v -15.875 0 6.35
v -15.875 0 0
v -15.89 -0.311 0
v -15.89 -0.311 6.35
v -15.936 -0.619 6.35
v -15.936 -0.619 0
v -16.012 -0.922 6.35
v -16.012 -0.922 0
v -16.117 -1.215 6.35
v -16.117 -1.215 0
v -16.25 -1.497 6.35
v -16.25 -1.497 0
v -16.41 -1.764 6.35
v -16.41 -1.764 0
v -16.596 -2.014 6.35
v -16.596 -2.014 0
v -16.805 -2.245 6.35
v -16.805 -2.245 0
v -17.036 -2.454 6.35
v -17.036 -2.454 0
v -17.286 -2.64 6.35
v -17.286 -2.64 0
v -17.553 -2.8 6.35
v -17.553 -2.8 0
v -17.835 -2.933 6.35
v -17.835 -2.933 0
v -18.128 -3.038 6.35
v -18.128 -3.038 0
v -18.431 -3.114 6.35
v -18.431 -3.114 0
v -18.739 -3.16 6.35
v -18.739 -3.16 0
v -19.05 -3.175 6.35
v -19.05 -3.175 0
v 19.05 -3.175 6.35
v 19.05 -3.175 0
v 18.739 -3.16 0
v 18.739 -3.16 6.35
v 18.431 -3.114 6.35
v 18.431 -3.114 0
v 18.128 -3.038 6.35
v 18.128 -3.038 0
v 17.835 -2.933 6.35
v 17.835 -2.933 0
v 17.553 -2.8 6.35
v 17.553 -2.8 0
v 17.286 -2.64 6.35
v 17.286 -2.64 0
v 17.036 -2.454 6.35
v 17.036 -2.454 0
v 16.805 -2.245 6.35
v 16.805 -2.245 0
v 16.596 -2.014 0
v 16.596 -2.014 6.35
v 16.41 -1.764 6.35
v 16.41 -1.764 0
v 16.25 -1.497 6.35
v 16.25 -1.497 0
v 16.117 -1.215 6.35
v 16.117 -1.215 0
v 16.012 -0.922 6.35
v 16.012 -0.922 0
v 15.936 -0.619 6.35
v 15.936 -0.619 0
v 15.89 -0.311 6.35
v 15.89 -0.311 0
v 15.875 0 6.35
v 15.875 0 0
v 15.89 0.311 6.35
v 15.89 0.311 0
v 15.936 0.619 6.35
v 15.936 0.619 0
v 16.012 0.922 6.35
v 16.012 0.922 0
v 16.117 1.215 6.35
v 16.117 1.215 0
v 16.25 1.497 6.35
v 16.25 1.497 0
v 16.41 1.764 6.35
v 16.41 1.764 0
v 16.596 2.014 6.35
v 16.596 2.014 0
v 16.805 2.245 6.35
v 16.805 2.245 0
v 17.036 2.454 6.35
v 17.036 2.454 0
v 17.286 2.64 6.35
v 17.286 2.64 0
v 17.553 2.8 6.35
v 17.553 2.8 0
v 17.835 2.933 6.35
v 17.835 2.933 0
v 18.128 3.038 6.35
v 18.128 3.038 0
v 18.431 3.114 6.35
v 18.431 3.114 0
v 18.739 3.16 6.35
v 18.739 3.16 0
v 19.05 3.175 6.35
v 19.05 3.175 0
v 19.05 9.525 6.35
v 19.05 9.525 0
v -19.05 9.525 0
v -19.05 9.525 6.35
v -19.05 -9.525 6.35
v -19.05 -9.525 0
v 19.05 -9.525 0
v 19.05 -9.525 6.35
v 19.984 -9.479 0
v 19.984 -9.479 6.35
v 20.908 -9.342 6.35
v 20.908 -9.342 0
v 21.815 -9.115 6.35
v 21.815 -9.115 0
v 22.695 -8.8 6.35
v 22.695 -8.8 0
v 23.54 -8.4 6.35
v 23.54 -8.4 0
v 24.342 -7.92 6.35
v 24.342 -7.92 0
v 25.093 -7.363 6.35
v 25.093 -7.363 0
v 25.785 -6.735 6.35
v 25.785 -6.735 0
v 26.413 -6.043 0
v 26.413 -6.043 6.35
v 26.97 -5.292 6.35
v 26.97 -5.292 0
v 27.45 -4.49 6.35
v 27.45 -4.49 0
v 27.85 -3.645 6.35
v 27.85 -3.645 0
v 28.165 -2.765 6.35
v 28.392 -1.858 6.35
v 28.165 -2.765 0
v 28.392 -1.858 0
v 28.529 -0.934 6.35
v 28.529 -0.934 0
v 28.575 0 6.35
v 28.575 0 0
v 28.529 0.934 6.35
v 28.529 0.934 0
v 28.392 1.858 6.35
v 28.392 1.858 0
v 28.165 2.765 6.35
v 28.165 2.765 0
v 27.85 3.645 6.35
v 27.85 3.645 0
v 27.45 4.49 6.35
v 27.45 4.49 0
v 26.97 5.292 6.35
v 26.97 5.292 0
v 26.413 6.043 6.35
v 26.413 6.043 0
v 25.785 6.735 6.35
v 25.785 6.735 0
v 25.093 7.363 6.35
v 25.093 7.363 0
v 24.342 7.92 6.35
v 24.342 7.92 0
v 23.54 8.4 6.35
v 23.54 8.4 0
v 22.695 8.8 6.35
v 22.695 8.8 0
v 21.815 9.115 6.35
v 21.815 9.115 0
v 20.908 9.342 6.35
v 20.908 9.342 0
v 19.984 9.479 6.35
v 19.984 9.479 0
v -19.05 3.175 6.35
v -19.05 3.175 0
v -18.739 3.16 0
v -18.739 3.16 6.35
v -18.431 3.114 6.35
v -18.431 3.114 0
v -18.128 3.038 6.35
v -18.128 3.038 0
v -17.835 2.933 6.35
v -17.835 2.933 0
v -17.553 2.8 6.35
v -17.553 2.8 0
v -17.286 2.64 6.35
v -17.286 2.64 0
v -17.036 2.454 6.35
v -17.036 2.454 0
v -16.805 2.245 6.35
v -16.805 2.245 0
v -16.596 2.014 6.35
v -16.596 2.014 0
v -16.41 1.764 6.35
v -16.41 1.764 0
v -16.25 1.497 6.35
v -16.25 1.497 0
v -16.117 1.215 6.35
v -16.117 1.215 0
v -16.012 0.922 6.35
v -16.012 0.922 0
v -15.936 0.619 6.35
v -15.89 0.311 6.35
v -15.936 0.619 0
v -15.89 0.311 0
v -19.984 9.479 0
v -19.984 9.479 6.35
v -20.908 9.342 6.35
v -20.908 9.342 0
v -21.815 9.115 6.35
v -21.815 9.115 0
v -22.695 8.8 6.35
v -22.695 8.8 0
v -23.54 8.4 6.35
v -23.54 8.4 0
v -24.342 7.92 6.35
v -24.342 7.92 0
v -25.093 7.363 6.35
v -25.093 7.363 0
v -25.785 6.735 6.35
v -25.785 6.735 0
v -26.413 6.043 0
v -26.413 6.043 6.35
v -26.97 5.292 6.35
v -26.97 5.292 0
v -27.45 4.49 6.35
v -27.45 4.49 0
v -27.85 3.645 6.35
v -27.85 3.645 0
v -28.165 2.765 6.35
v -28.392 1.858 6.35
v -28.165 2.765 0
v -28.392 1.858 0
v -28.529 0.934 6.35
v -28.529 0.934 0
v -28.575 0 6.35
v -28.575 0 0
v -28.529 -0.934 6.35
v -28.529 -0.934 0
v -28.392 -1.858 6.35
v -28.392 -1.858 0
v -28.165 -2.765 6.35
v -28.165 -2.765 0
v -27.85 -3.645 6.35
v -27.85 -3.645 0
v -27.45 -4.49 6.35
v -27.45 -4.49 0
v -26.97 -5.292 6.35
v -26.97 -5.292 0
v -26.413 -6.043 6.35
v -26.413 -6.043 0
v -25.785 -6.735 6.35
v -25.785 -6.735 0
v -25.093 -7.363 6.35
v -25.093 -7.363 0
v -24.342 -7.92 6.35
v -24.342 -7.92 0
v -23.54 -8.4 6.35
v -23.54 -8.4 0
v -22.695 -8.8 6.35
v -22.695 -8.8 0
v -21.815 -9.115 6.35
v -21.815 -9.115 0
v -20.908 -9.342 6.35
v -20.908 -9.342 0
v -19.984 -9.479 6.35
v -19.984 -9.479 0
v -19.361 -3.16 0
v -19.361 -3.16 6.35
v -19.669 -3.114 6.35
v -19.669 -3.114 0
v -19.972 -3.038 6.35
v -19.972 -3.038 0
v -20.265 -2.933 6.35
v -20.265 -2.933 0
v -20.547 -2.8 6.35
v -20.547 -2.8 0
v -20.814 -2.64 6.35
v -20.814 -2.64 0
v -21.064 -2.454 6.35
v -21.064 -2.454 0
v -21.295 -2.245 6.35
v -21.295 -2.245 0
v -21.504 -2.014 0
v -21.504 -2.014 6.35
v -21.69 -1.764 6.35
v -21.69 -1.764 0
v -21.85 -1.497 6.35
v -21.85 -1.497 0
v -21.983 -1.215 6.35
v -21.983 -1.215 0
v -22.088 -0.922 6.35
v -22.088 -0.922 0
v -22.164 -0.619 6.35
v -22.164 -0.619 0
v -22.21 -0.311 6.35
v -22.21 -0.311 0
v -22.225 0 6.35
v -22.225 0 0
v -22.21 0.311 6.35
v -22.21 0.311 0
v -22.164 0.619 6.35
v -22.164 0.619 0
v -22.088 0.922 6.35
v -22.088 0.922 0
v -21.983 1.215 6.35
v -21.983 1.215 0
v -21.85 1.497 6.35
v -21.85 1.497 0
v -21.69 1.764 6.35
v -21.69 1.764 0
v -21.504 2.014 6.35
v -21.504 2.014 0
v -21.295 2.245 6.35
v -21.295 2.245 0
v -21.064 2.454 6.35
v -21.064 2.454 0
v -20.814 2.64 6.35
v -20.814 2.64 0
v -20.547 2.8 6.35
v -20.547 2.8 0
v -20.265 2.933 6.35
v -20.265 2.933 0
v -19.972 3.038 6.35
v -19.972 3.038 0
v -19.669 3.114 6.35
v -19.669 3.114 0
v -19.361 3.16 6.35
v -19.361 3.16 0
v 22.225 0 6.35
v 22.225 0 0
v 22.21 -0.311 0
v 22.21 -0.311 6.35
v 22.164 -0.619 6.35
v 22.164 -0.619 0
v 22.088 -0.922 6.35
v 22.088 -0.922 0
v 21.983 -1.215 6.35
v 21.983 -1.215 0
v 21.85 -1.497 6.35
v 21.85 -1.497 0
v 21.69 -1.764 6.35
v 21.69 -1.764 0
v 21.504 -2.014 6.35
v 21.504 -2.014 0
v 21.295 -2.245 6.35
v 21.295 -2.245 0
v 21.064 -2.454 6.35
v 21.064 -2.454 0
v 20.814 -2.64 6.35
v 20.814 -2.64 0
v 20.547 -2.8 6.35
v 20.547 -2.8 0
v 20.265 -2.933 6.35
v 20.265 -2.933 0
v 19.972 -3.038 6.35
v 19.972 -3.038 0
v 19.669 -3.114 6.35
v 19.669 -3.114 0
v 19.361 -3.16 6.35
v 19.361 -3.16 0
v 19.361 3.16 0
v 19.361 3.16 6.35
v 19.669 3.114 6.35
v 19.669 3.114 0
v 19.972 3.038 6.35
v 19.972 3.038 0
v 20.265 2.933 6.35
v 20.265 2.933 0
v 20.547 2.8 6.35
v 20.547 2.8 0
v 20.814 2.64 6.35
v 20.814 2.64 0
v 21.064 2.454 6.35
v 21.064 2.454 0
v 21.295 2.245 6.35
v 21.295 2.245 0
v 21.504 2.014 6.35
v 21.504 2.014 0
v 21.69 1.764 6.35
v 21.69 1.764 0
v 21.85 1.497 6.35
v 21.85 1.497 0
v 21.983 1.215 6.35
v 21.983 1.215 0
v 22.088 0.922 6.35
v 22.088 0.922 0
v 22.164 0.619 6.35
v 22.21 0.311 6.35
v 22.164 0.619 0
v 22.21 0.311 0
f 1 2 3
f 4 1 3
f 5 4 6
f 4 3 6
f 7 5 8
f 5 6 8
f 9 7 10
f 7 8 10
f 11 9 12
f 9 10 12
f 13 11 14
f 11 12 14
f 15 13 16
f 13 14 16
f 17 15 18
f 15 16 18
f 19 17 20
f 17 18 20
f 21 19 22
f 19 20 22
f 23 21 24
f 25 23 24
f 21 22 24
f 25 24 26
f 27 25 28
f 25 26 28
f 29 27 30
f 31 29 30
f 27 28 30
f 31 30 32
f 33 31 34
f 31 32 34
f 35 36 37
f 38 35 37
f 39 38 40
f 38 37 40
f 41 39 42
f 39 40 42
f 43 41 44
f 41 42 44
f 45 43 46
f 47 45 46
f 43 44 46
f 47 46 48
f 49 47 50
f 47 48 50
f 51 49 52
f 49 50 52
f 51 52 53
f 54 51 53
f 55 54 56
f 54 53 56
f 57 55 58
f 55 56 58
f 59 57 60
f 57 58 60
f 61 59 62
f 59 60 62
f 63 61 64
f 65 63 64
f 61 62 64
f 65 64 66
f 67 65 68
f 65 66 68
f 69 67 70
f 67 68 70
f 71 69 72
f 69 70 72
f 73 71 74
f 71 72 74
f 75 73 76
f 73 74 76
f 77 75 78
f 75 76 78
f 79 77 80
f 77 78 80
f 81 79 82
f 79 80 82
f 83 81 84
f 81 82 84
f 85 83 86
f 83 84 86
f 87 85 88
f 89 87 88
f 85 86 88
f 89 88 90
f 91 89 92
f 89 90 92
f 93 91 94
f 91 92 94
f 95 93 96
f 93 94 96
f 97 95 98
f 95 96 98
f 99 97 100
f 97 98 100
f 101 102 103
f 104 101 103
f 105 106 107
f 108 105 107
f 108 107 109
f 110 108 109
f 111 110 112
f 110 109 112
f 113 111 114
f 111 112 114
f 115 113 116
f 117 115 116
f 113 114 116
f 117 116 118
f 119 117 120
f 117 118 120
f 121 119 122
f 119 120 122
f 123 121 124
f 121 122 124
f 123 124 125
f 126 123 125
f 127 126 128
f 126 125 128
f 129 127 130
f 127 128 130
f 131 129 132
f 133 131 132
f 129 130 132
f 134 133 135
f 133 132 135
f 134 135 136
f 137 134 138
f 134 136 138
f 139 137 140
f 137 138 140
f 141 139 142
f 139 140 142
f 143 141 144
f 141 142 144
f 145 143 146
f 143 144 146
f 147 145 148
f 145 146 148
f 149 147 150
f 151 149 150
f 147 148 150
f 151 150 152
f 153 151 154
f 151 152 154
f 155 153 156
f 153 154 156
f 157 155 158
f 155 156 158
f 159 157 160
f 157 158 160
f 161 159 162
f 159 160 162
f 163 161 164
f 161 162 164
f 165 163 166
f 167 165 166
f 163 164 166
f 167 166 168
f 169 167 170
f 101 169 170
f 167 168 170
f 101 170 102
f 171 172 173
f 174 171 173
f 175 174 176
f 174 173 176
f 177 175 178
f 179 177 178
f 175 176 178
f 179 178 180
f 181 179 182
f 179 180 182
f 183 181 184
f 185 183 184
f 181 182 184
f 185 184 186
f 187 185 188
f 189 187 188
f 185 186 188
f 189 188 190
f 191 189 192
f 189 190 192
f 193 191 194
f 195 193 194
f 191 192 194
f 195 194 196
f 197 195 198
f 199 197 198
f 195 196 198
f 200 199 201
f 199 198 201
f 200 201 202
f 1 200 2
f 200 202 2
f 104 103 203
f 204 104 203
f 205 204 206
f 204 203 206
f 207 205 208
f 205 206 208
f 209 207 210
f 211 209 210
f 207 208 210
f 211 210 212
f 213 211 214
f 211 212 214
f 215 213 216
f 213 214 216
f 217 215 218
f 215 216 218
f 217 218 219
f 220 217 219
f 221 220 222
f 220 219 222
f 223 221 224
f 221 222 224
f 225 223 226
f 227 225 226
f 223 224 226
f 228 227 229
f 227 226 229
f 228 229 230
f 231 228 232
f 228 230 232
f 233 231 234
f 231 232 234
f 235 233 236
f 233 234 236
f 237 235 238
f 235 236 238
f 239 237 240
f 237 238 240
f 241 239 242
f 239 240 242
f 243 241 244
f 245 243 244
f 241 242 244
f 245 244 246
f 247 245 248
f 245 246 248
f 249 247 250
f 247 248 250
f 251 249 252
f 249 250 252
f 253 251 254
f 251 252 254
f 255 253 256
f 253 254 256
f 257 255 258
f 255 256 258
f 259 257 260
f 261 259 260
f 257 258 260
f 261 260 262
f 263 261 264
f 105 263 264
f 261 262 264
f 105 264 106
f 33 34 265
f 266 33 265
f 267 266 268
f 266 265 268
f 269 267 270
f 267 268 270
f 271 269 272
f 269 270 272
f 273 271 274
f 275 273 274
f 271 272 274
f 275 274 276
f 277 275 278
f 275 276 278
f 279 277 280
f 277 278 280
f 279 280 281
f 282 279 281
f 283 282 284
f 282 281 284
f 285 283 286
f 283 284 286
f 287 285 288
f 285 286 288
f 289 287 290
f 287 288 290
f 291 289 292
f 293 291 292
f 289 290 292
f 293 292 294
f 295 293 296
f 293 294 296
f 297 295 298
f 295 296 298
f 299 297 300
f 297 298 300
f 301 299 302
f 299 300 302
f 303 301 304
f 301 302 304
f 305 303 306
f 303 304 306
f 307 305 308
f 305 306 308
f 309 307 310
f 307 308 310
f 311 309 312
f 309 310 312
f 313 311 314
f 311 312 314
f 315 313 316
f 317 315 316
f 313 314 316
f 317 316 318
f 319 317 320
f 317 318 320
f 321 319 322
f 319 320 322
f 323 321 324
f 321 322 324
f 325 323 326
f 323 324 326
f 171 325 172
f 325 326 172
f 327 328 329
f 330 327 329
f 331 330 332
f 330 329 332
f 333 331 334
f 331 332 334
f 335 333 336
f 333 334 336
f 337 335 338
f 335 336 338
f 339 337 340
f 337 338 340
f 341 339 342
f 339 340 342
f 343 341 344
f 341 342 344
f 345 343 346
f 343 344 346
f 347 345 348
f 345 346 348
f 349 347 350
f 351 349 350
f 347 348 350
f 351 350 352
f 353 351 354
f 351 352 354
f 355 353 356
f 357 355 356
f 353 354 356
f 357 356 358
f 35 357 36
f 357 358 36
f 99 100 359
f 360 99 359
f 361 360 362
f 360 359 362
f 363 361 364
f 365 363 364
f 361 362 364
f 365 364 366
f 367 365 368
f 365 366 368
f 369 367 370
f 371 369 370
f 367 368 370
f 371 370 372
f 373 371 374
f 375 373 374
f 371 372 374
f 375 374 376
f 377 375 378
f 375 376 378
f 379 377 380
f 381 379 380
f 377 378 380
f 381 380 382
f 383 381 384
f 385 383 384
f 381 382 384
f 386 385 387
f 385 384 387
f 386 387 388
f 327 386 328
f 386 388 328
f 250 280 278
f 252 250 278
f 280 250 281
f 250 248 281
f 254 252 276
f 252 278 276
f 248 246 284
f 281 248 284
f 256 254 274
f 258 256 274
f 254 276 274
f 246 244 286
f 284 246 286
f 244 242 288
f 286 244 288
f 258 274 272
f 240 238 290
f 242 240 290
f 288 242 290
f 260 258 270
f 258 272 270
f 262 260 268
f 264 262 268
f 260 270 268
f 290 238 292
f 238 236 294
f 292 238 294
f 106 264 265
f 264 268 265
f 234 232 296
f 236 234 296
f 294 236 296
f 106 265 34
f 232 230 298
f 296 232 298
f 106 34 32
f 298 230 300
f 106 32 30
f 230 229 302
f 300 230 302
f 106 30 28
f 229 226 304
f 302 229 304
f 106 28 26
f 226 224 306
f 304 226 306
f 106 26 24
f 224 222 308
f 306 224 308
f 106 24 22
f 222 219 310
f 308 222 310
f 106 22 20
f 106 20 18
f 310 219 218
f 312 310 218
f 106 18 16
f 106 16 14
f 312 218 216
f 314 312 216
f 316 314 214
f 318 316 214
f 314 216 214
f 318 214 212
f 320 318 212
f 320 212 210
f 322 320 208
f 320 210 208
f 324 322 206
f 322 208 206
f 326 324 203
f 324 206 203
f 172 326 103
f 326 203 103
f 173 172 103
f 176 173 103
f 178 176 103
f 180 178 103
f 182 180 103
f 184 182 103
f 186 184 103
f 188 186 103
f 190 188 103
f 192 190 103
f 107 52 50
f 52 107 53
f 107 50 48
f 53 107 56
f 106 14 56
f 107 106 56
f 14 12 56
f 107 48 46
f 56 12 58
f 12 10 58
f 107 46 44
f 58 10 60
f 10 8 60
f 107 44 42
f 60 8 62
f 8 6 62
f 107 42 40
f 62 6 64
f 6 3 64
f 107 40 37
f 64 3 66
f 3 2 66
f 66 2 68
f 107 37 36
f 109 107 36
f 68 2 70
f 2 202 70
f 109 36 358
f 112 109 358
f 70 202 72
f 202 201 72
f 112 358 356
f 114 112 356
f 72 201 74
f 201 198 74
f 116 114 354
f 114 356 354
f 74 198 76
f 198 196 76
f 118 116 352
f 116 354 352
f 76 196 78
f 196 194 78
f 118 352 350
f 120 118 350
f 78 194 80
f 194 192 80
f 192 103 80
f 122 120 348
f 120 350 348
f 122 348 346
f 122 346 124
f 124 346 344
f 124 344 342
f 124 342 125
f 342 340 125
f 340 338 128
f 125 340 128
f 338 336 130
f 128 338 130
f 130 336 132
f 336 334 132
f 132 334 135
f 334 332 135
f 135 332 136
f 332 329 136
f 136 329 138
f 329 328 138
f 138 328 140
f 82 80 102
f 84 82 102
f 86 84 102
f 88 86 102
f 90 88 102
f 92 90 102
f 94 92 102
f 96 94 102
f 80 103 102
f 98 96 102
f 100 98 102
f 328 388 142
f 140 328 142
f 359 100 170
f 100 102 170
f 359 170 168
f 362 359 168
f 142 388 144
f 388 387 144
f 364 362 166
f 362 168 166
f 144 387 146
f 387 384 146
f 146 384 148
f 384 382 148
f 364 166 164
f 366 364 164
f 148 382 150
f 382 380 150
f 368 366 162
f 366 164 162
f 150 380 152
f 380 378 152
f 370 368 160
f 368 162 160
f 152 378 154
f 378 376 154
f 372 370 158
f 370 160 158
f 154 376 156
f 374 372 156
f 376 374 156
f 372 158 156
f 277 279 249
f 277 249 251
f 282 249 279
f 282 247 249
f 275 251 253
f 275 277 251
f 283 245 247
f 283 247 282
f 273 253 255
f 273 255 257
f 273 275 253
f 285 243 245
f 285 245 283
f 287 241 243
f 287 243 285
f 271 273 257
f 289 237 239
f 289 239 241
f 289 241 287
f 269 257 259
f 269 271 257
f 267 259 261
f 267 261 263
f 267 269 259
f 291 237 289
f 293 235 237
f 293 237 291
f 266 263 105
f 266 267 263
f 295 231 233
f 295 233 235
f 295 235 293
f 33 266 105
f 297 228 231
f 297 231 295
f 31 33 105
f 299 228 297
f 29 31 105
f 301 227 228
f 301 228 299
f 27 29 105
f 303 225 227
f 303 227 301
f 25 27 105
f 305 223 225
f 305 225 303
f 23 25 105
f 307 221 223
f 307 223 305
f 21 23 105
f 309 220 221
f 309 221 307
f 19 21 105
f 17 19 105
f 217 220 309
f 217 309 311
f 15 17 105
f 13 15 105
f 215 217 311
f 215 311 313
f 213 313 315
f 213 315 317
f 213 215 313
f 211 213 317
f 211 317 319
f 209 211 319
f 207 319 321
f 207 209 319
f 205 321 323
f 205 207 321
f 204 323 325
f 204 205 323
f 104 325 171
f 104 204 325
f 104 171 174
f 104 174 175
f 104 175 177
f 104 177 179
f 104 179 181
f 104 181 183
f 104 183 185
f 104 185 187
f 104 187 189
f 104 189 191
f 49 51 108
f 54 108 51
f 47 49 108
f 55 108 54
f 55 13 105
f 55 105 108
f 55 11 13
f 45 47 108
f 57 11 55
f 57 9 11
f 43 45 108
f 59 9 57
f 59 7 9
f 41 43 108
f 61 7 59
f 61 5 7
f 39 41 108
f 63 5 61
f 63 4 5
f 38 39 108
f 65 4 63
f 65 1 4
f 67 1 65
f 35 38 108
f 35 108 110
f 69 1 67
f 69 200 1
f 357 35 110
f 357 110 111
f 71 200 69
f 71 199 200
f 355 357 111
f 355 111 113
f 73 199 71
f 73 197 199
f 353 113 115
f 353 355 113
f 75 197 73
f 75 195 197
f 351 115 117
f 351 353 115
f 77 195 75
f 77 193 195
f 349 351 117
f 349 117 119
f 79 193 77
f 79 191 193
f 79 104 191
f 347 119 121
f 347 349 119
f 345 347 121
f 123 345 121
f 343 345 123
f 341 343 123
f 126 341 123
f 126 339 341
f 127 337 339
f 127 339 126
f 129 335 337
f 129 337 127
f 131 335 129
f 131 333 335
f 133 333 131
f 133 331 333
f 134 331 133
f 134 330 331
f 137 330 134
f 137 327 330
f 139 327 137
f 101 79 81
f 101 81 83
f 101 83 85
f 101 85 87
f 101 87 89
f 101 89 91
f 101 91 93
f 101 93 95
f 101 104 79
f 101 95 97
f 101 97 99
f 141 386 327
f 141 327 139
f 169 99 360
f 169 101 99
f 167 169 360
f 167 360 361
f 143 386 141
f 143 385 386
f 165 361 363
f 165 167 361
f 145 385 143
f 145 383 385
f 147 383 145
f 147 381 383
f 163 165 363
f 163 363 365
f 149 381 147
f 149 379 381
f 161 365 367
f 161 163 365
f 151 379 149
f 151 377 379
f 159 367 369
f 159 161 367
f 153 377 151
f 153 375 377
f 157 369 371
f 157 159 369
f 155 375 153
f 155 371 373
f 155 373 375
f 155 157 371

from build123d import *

# Parameters (mm, degrees)
F1_DEPTH = 6.35


with BuildPart() as f1:
    # F0 (on Top) → F1 (new body)
    with BuildSketch(Plane.XY):
        with BuildLine():
            Line((19.05, 3.175), (19.05, 9.525))
            Line((19.05, 9.525), (-19.05, 9.525))
            Line((-19.05, 9.525), (-19.05, 3.175))
            ThreePointArc((-19.05, 3.175), (-16.804936, 2.245064), (-15.875, 0))
            ThreePointArc((-15.875, 0), (-16.804936, -2.245064), (-19.05, -3.175))
            Line((-19.05, -3.175), (-19.05, -9.525))
            Line((-19.05, -9.525), (19.05, -9.525))
            Line((19.05, -9.525), (19.05, -3.175))
            ThreePointArc((19.05, -3.175), (15.875, 0), (19.05, 3.175))
        make_face()
        with BuildLine():
            ThreePointArc((19.05, -9.525), (28.575, 0), (19.05, 9.525))
            Line((19.05, 9.525), (19.05, 3.175))
            ThreePointArc((19.05, 3.175), (21.295064, 2.245064), (22.225, 0))
            ThreePointArc((22.225, 0), (21.295064, -2.245064), (19.05, -3.175))
            Line((19.05, -3.175), (19.05, -9.525))
        make_face()
        with BuildLine():
            Line((-19.05, 3.175), (-19.05, 9.525))
            ThreePointArc((-19.05, 9.525), (-28.575, 0), (-19.05, -9.525))
            Line((-19.05, -9.525), (-19.05, -3.175))
            ThreePointArc((-19.05, -3.175), (-22.225, 0), (-19.05, 3.175))
        make_face()
    extrude(amount=F1_DEPTH)


solid = f1.part
